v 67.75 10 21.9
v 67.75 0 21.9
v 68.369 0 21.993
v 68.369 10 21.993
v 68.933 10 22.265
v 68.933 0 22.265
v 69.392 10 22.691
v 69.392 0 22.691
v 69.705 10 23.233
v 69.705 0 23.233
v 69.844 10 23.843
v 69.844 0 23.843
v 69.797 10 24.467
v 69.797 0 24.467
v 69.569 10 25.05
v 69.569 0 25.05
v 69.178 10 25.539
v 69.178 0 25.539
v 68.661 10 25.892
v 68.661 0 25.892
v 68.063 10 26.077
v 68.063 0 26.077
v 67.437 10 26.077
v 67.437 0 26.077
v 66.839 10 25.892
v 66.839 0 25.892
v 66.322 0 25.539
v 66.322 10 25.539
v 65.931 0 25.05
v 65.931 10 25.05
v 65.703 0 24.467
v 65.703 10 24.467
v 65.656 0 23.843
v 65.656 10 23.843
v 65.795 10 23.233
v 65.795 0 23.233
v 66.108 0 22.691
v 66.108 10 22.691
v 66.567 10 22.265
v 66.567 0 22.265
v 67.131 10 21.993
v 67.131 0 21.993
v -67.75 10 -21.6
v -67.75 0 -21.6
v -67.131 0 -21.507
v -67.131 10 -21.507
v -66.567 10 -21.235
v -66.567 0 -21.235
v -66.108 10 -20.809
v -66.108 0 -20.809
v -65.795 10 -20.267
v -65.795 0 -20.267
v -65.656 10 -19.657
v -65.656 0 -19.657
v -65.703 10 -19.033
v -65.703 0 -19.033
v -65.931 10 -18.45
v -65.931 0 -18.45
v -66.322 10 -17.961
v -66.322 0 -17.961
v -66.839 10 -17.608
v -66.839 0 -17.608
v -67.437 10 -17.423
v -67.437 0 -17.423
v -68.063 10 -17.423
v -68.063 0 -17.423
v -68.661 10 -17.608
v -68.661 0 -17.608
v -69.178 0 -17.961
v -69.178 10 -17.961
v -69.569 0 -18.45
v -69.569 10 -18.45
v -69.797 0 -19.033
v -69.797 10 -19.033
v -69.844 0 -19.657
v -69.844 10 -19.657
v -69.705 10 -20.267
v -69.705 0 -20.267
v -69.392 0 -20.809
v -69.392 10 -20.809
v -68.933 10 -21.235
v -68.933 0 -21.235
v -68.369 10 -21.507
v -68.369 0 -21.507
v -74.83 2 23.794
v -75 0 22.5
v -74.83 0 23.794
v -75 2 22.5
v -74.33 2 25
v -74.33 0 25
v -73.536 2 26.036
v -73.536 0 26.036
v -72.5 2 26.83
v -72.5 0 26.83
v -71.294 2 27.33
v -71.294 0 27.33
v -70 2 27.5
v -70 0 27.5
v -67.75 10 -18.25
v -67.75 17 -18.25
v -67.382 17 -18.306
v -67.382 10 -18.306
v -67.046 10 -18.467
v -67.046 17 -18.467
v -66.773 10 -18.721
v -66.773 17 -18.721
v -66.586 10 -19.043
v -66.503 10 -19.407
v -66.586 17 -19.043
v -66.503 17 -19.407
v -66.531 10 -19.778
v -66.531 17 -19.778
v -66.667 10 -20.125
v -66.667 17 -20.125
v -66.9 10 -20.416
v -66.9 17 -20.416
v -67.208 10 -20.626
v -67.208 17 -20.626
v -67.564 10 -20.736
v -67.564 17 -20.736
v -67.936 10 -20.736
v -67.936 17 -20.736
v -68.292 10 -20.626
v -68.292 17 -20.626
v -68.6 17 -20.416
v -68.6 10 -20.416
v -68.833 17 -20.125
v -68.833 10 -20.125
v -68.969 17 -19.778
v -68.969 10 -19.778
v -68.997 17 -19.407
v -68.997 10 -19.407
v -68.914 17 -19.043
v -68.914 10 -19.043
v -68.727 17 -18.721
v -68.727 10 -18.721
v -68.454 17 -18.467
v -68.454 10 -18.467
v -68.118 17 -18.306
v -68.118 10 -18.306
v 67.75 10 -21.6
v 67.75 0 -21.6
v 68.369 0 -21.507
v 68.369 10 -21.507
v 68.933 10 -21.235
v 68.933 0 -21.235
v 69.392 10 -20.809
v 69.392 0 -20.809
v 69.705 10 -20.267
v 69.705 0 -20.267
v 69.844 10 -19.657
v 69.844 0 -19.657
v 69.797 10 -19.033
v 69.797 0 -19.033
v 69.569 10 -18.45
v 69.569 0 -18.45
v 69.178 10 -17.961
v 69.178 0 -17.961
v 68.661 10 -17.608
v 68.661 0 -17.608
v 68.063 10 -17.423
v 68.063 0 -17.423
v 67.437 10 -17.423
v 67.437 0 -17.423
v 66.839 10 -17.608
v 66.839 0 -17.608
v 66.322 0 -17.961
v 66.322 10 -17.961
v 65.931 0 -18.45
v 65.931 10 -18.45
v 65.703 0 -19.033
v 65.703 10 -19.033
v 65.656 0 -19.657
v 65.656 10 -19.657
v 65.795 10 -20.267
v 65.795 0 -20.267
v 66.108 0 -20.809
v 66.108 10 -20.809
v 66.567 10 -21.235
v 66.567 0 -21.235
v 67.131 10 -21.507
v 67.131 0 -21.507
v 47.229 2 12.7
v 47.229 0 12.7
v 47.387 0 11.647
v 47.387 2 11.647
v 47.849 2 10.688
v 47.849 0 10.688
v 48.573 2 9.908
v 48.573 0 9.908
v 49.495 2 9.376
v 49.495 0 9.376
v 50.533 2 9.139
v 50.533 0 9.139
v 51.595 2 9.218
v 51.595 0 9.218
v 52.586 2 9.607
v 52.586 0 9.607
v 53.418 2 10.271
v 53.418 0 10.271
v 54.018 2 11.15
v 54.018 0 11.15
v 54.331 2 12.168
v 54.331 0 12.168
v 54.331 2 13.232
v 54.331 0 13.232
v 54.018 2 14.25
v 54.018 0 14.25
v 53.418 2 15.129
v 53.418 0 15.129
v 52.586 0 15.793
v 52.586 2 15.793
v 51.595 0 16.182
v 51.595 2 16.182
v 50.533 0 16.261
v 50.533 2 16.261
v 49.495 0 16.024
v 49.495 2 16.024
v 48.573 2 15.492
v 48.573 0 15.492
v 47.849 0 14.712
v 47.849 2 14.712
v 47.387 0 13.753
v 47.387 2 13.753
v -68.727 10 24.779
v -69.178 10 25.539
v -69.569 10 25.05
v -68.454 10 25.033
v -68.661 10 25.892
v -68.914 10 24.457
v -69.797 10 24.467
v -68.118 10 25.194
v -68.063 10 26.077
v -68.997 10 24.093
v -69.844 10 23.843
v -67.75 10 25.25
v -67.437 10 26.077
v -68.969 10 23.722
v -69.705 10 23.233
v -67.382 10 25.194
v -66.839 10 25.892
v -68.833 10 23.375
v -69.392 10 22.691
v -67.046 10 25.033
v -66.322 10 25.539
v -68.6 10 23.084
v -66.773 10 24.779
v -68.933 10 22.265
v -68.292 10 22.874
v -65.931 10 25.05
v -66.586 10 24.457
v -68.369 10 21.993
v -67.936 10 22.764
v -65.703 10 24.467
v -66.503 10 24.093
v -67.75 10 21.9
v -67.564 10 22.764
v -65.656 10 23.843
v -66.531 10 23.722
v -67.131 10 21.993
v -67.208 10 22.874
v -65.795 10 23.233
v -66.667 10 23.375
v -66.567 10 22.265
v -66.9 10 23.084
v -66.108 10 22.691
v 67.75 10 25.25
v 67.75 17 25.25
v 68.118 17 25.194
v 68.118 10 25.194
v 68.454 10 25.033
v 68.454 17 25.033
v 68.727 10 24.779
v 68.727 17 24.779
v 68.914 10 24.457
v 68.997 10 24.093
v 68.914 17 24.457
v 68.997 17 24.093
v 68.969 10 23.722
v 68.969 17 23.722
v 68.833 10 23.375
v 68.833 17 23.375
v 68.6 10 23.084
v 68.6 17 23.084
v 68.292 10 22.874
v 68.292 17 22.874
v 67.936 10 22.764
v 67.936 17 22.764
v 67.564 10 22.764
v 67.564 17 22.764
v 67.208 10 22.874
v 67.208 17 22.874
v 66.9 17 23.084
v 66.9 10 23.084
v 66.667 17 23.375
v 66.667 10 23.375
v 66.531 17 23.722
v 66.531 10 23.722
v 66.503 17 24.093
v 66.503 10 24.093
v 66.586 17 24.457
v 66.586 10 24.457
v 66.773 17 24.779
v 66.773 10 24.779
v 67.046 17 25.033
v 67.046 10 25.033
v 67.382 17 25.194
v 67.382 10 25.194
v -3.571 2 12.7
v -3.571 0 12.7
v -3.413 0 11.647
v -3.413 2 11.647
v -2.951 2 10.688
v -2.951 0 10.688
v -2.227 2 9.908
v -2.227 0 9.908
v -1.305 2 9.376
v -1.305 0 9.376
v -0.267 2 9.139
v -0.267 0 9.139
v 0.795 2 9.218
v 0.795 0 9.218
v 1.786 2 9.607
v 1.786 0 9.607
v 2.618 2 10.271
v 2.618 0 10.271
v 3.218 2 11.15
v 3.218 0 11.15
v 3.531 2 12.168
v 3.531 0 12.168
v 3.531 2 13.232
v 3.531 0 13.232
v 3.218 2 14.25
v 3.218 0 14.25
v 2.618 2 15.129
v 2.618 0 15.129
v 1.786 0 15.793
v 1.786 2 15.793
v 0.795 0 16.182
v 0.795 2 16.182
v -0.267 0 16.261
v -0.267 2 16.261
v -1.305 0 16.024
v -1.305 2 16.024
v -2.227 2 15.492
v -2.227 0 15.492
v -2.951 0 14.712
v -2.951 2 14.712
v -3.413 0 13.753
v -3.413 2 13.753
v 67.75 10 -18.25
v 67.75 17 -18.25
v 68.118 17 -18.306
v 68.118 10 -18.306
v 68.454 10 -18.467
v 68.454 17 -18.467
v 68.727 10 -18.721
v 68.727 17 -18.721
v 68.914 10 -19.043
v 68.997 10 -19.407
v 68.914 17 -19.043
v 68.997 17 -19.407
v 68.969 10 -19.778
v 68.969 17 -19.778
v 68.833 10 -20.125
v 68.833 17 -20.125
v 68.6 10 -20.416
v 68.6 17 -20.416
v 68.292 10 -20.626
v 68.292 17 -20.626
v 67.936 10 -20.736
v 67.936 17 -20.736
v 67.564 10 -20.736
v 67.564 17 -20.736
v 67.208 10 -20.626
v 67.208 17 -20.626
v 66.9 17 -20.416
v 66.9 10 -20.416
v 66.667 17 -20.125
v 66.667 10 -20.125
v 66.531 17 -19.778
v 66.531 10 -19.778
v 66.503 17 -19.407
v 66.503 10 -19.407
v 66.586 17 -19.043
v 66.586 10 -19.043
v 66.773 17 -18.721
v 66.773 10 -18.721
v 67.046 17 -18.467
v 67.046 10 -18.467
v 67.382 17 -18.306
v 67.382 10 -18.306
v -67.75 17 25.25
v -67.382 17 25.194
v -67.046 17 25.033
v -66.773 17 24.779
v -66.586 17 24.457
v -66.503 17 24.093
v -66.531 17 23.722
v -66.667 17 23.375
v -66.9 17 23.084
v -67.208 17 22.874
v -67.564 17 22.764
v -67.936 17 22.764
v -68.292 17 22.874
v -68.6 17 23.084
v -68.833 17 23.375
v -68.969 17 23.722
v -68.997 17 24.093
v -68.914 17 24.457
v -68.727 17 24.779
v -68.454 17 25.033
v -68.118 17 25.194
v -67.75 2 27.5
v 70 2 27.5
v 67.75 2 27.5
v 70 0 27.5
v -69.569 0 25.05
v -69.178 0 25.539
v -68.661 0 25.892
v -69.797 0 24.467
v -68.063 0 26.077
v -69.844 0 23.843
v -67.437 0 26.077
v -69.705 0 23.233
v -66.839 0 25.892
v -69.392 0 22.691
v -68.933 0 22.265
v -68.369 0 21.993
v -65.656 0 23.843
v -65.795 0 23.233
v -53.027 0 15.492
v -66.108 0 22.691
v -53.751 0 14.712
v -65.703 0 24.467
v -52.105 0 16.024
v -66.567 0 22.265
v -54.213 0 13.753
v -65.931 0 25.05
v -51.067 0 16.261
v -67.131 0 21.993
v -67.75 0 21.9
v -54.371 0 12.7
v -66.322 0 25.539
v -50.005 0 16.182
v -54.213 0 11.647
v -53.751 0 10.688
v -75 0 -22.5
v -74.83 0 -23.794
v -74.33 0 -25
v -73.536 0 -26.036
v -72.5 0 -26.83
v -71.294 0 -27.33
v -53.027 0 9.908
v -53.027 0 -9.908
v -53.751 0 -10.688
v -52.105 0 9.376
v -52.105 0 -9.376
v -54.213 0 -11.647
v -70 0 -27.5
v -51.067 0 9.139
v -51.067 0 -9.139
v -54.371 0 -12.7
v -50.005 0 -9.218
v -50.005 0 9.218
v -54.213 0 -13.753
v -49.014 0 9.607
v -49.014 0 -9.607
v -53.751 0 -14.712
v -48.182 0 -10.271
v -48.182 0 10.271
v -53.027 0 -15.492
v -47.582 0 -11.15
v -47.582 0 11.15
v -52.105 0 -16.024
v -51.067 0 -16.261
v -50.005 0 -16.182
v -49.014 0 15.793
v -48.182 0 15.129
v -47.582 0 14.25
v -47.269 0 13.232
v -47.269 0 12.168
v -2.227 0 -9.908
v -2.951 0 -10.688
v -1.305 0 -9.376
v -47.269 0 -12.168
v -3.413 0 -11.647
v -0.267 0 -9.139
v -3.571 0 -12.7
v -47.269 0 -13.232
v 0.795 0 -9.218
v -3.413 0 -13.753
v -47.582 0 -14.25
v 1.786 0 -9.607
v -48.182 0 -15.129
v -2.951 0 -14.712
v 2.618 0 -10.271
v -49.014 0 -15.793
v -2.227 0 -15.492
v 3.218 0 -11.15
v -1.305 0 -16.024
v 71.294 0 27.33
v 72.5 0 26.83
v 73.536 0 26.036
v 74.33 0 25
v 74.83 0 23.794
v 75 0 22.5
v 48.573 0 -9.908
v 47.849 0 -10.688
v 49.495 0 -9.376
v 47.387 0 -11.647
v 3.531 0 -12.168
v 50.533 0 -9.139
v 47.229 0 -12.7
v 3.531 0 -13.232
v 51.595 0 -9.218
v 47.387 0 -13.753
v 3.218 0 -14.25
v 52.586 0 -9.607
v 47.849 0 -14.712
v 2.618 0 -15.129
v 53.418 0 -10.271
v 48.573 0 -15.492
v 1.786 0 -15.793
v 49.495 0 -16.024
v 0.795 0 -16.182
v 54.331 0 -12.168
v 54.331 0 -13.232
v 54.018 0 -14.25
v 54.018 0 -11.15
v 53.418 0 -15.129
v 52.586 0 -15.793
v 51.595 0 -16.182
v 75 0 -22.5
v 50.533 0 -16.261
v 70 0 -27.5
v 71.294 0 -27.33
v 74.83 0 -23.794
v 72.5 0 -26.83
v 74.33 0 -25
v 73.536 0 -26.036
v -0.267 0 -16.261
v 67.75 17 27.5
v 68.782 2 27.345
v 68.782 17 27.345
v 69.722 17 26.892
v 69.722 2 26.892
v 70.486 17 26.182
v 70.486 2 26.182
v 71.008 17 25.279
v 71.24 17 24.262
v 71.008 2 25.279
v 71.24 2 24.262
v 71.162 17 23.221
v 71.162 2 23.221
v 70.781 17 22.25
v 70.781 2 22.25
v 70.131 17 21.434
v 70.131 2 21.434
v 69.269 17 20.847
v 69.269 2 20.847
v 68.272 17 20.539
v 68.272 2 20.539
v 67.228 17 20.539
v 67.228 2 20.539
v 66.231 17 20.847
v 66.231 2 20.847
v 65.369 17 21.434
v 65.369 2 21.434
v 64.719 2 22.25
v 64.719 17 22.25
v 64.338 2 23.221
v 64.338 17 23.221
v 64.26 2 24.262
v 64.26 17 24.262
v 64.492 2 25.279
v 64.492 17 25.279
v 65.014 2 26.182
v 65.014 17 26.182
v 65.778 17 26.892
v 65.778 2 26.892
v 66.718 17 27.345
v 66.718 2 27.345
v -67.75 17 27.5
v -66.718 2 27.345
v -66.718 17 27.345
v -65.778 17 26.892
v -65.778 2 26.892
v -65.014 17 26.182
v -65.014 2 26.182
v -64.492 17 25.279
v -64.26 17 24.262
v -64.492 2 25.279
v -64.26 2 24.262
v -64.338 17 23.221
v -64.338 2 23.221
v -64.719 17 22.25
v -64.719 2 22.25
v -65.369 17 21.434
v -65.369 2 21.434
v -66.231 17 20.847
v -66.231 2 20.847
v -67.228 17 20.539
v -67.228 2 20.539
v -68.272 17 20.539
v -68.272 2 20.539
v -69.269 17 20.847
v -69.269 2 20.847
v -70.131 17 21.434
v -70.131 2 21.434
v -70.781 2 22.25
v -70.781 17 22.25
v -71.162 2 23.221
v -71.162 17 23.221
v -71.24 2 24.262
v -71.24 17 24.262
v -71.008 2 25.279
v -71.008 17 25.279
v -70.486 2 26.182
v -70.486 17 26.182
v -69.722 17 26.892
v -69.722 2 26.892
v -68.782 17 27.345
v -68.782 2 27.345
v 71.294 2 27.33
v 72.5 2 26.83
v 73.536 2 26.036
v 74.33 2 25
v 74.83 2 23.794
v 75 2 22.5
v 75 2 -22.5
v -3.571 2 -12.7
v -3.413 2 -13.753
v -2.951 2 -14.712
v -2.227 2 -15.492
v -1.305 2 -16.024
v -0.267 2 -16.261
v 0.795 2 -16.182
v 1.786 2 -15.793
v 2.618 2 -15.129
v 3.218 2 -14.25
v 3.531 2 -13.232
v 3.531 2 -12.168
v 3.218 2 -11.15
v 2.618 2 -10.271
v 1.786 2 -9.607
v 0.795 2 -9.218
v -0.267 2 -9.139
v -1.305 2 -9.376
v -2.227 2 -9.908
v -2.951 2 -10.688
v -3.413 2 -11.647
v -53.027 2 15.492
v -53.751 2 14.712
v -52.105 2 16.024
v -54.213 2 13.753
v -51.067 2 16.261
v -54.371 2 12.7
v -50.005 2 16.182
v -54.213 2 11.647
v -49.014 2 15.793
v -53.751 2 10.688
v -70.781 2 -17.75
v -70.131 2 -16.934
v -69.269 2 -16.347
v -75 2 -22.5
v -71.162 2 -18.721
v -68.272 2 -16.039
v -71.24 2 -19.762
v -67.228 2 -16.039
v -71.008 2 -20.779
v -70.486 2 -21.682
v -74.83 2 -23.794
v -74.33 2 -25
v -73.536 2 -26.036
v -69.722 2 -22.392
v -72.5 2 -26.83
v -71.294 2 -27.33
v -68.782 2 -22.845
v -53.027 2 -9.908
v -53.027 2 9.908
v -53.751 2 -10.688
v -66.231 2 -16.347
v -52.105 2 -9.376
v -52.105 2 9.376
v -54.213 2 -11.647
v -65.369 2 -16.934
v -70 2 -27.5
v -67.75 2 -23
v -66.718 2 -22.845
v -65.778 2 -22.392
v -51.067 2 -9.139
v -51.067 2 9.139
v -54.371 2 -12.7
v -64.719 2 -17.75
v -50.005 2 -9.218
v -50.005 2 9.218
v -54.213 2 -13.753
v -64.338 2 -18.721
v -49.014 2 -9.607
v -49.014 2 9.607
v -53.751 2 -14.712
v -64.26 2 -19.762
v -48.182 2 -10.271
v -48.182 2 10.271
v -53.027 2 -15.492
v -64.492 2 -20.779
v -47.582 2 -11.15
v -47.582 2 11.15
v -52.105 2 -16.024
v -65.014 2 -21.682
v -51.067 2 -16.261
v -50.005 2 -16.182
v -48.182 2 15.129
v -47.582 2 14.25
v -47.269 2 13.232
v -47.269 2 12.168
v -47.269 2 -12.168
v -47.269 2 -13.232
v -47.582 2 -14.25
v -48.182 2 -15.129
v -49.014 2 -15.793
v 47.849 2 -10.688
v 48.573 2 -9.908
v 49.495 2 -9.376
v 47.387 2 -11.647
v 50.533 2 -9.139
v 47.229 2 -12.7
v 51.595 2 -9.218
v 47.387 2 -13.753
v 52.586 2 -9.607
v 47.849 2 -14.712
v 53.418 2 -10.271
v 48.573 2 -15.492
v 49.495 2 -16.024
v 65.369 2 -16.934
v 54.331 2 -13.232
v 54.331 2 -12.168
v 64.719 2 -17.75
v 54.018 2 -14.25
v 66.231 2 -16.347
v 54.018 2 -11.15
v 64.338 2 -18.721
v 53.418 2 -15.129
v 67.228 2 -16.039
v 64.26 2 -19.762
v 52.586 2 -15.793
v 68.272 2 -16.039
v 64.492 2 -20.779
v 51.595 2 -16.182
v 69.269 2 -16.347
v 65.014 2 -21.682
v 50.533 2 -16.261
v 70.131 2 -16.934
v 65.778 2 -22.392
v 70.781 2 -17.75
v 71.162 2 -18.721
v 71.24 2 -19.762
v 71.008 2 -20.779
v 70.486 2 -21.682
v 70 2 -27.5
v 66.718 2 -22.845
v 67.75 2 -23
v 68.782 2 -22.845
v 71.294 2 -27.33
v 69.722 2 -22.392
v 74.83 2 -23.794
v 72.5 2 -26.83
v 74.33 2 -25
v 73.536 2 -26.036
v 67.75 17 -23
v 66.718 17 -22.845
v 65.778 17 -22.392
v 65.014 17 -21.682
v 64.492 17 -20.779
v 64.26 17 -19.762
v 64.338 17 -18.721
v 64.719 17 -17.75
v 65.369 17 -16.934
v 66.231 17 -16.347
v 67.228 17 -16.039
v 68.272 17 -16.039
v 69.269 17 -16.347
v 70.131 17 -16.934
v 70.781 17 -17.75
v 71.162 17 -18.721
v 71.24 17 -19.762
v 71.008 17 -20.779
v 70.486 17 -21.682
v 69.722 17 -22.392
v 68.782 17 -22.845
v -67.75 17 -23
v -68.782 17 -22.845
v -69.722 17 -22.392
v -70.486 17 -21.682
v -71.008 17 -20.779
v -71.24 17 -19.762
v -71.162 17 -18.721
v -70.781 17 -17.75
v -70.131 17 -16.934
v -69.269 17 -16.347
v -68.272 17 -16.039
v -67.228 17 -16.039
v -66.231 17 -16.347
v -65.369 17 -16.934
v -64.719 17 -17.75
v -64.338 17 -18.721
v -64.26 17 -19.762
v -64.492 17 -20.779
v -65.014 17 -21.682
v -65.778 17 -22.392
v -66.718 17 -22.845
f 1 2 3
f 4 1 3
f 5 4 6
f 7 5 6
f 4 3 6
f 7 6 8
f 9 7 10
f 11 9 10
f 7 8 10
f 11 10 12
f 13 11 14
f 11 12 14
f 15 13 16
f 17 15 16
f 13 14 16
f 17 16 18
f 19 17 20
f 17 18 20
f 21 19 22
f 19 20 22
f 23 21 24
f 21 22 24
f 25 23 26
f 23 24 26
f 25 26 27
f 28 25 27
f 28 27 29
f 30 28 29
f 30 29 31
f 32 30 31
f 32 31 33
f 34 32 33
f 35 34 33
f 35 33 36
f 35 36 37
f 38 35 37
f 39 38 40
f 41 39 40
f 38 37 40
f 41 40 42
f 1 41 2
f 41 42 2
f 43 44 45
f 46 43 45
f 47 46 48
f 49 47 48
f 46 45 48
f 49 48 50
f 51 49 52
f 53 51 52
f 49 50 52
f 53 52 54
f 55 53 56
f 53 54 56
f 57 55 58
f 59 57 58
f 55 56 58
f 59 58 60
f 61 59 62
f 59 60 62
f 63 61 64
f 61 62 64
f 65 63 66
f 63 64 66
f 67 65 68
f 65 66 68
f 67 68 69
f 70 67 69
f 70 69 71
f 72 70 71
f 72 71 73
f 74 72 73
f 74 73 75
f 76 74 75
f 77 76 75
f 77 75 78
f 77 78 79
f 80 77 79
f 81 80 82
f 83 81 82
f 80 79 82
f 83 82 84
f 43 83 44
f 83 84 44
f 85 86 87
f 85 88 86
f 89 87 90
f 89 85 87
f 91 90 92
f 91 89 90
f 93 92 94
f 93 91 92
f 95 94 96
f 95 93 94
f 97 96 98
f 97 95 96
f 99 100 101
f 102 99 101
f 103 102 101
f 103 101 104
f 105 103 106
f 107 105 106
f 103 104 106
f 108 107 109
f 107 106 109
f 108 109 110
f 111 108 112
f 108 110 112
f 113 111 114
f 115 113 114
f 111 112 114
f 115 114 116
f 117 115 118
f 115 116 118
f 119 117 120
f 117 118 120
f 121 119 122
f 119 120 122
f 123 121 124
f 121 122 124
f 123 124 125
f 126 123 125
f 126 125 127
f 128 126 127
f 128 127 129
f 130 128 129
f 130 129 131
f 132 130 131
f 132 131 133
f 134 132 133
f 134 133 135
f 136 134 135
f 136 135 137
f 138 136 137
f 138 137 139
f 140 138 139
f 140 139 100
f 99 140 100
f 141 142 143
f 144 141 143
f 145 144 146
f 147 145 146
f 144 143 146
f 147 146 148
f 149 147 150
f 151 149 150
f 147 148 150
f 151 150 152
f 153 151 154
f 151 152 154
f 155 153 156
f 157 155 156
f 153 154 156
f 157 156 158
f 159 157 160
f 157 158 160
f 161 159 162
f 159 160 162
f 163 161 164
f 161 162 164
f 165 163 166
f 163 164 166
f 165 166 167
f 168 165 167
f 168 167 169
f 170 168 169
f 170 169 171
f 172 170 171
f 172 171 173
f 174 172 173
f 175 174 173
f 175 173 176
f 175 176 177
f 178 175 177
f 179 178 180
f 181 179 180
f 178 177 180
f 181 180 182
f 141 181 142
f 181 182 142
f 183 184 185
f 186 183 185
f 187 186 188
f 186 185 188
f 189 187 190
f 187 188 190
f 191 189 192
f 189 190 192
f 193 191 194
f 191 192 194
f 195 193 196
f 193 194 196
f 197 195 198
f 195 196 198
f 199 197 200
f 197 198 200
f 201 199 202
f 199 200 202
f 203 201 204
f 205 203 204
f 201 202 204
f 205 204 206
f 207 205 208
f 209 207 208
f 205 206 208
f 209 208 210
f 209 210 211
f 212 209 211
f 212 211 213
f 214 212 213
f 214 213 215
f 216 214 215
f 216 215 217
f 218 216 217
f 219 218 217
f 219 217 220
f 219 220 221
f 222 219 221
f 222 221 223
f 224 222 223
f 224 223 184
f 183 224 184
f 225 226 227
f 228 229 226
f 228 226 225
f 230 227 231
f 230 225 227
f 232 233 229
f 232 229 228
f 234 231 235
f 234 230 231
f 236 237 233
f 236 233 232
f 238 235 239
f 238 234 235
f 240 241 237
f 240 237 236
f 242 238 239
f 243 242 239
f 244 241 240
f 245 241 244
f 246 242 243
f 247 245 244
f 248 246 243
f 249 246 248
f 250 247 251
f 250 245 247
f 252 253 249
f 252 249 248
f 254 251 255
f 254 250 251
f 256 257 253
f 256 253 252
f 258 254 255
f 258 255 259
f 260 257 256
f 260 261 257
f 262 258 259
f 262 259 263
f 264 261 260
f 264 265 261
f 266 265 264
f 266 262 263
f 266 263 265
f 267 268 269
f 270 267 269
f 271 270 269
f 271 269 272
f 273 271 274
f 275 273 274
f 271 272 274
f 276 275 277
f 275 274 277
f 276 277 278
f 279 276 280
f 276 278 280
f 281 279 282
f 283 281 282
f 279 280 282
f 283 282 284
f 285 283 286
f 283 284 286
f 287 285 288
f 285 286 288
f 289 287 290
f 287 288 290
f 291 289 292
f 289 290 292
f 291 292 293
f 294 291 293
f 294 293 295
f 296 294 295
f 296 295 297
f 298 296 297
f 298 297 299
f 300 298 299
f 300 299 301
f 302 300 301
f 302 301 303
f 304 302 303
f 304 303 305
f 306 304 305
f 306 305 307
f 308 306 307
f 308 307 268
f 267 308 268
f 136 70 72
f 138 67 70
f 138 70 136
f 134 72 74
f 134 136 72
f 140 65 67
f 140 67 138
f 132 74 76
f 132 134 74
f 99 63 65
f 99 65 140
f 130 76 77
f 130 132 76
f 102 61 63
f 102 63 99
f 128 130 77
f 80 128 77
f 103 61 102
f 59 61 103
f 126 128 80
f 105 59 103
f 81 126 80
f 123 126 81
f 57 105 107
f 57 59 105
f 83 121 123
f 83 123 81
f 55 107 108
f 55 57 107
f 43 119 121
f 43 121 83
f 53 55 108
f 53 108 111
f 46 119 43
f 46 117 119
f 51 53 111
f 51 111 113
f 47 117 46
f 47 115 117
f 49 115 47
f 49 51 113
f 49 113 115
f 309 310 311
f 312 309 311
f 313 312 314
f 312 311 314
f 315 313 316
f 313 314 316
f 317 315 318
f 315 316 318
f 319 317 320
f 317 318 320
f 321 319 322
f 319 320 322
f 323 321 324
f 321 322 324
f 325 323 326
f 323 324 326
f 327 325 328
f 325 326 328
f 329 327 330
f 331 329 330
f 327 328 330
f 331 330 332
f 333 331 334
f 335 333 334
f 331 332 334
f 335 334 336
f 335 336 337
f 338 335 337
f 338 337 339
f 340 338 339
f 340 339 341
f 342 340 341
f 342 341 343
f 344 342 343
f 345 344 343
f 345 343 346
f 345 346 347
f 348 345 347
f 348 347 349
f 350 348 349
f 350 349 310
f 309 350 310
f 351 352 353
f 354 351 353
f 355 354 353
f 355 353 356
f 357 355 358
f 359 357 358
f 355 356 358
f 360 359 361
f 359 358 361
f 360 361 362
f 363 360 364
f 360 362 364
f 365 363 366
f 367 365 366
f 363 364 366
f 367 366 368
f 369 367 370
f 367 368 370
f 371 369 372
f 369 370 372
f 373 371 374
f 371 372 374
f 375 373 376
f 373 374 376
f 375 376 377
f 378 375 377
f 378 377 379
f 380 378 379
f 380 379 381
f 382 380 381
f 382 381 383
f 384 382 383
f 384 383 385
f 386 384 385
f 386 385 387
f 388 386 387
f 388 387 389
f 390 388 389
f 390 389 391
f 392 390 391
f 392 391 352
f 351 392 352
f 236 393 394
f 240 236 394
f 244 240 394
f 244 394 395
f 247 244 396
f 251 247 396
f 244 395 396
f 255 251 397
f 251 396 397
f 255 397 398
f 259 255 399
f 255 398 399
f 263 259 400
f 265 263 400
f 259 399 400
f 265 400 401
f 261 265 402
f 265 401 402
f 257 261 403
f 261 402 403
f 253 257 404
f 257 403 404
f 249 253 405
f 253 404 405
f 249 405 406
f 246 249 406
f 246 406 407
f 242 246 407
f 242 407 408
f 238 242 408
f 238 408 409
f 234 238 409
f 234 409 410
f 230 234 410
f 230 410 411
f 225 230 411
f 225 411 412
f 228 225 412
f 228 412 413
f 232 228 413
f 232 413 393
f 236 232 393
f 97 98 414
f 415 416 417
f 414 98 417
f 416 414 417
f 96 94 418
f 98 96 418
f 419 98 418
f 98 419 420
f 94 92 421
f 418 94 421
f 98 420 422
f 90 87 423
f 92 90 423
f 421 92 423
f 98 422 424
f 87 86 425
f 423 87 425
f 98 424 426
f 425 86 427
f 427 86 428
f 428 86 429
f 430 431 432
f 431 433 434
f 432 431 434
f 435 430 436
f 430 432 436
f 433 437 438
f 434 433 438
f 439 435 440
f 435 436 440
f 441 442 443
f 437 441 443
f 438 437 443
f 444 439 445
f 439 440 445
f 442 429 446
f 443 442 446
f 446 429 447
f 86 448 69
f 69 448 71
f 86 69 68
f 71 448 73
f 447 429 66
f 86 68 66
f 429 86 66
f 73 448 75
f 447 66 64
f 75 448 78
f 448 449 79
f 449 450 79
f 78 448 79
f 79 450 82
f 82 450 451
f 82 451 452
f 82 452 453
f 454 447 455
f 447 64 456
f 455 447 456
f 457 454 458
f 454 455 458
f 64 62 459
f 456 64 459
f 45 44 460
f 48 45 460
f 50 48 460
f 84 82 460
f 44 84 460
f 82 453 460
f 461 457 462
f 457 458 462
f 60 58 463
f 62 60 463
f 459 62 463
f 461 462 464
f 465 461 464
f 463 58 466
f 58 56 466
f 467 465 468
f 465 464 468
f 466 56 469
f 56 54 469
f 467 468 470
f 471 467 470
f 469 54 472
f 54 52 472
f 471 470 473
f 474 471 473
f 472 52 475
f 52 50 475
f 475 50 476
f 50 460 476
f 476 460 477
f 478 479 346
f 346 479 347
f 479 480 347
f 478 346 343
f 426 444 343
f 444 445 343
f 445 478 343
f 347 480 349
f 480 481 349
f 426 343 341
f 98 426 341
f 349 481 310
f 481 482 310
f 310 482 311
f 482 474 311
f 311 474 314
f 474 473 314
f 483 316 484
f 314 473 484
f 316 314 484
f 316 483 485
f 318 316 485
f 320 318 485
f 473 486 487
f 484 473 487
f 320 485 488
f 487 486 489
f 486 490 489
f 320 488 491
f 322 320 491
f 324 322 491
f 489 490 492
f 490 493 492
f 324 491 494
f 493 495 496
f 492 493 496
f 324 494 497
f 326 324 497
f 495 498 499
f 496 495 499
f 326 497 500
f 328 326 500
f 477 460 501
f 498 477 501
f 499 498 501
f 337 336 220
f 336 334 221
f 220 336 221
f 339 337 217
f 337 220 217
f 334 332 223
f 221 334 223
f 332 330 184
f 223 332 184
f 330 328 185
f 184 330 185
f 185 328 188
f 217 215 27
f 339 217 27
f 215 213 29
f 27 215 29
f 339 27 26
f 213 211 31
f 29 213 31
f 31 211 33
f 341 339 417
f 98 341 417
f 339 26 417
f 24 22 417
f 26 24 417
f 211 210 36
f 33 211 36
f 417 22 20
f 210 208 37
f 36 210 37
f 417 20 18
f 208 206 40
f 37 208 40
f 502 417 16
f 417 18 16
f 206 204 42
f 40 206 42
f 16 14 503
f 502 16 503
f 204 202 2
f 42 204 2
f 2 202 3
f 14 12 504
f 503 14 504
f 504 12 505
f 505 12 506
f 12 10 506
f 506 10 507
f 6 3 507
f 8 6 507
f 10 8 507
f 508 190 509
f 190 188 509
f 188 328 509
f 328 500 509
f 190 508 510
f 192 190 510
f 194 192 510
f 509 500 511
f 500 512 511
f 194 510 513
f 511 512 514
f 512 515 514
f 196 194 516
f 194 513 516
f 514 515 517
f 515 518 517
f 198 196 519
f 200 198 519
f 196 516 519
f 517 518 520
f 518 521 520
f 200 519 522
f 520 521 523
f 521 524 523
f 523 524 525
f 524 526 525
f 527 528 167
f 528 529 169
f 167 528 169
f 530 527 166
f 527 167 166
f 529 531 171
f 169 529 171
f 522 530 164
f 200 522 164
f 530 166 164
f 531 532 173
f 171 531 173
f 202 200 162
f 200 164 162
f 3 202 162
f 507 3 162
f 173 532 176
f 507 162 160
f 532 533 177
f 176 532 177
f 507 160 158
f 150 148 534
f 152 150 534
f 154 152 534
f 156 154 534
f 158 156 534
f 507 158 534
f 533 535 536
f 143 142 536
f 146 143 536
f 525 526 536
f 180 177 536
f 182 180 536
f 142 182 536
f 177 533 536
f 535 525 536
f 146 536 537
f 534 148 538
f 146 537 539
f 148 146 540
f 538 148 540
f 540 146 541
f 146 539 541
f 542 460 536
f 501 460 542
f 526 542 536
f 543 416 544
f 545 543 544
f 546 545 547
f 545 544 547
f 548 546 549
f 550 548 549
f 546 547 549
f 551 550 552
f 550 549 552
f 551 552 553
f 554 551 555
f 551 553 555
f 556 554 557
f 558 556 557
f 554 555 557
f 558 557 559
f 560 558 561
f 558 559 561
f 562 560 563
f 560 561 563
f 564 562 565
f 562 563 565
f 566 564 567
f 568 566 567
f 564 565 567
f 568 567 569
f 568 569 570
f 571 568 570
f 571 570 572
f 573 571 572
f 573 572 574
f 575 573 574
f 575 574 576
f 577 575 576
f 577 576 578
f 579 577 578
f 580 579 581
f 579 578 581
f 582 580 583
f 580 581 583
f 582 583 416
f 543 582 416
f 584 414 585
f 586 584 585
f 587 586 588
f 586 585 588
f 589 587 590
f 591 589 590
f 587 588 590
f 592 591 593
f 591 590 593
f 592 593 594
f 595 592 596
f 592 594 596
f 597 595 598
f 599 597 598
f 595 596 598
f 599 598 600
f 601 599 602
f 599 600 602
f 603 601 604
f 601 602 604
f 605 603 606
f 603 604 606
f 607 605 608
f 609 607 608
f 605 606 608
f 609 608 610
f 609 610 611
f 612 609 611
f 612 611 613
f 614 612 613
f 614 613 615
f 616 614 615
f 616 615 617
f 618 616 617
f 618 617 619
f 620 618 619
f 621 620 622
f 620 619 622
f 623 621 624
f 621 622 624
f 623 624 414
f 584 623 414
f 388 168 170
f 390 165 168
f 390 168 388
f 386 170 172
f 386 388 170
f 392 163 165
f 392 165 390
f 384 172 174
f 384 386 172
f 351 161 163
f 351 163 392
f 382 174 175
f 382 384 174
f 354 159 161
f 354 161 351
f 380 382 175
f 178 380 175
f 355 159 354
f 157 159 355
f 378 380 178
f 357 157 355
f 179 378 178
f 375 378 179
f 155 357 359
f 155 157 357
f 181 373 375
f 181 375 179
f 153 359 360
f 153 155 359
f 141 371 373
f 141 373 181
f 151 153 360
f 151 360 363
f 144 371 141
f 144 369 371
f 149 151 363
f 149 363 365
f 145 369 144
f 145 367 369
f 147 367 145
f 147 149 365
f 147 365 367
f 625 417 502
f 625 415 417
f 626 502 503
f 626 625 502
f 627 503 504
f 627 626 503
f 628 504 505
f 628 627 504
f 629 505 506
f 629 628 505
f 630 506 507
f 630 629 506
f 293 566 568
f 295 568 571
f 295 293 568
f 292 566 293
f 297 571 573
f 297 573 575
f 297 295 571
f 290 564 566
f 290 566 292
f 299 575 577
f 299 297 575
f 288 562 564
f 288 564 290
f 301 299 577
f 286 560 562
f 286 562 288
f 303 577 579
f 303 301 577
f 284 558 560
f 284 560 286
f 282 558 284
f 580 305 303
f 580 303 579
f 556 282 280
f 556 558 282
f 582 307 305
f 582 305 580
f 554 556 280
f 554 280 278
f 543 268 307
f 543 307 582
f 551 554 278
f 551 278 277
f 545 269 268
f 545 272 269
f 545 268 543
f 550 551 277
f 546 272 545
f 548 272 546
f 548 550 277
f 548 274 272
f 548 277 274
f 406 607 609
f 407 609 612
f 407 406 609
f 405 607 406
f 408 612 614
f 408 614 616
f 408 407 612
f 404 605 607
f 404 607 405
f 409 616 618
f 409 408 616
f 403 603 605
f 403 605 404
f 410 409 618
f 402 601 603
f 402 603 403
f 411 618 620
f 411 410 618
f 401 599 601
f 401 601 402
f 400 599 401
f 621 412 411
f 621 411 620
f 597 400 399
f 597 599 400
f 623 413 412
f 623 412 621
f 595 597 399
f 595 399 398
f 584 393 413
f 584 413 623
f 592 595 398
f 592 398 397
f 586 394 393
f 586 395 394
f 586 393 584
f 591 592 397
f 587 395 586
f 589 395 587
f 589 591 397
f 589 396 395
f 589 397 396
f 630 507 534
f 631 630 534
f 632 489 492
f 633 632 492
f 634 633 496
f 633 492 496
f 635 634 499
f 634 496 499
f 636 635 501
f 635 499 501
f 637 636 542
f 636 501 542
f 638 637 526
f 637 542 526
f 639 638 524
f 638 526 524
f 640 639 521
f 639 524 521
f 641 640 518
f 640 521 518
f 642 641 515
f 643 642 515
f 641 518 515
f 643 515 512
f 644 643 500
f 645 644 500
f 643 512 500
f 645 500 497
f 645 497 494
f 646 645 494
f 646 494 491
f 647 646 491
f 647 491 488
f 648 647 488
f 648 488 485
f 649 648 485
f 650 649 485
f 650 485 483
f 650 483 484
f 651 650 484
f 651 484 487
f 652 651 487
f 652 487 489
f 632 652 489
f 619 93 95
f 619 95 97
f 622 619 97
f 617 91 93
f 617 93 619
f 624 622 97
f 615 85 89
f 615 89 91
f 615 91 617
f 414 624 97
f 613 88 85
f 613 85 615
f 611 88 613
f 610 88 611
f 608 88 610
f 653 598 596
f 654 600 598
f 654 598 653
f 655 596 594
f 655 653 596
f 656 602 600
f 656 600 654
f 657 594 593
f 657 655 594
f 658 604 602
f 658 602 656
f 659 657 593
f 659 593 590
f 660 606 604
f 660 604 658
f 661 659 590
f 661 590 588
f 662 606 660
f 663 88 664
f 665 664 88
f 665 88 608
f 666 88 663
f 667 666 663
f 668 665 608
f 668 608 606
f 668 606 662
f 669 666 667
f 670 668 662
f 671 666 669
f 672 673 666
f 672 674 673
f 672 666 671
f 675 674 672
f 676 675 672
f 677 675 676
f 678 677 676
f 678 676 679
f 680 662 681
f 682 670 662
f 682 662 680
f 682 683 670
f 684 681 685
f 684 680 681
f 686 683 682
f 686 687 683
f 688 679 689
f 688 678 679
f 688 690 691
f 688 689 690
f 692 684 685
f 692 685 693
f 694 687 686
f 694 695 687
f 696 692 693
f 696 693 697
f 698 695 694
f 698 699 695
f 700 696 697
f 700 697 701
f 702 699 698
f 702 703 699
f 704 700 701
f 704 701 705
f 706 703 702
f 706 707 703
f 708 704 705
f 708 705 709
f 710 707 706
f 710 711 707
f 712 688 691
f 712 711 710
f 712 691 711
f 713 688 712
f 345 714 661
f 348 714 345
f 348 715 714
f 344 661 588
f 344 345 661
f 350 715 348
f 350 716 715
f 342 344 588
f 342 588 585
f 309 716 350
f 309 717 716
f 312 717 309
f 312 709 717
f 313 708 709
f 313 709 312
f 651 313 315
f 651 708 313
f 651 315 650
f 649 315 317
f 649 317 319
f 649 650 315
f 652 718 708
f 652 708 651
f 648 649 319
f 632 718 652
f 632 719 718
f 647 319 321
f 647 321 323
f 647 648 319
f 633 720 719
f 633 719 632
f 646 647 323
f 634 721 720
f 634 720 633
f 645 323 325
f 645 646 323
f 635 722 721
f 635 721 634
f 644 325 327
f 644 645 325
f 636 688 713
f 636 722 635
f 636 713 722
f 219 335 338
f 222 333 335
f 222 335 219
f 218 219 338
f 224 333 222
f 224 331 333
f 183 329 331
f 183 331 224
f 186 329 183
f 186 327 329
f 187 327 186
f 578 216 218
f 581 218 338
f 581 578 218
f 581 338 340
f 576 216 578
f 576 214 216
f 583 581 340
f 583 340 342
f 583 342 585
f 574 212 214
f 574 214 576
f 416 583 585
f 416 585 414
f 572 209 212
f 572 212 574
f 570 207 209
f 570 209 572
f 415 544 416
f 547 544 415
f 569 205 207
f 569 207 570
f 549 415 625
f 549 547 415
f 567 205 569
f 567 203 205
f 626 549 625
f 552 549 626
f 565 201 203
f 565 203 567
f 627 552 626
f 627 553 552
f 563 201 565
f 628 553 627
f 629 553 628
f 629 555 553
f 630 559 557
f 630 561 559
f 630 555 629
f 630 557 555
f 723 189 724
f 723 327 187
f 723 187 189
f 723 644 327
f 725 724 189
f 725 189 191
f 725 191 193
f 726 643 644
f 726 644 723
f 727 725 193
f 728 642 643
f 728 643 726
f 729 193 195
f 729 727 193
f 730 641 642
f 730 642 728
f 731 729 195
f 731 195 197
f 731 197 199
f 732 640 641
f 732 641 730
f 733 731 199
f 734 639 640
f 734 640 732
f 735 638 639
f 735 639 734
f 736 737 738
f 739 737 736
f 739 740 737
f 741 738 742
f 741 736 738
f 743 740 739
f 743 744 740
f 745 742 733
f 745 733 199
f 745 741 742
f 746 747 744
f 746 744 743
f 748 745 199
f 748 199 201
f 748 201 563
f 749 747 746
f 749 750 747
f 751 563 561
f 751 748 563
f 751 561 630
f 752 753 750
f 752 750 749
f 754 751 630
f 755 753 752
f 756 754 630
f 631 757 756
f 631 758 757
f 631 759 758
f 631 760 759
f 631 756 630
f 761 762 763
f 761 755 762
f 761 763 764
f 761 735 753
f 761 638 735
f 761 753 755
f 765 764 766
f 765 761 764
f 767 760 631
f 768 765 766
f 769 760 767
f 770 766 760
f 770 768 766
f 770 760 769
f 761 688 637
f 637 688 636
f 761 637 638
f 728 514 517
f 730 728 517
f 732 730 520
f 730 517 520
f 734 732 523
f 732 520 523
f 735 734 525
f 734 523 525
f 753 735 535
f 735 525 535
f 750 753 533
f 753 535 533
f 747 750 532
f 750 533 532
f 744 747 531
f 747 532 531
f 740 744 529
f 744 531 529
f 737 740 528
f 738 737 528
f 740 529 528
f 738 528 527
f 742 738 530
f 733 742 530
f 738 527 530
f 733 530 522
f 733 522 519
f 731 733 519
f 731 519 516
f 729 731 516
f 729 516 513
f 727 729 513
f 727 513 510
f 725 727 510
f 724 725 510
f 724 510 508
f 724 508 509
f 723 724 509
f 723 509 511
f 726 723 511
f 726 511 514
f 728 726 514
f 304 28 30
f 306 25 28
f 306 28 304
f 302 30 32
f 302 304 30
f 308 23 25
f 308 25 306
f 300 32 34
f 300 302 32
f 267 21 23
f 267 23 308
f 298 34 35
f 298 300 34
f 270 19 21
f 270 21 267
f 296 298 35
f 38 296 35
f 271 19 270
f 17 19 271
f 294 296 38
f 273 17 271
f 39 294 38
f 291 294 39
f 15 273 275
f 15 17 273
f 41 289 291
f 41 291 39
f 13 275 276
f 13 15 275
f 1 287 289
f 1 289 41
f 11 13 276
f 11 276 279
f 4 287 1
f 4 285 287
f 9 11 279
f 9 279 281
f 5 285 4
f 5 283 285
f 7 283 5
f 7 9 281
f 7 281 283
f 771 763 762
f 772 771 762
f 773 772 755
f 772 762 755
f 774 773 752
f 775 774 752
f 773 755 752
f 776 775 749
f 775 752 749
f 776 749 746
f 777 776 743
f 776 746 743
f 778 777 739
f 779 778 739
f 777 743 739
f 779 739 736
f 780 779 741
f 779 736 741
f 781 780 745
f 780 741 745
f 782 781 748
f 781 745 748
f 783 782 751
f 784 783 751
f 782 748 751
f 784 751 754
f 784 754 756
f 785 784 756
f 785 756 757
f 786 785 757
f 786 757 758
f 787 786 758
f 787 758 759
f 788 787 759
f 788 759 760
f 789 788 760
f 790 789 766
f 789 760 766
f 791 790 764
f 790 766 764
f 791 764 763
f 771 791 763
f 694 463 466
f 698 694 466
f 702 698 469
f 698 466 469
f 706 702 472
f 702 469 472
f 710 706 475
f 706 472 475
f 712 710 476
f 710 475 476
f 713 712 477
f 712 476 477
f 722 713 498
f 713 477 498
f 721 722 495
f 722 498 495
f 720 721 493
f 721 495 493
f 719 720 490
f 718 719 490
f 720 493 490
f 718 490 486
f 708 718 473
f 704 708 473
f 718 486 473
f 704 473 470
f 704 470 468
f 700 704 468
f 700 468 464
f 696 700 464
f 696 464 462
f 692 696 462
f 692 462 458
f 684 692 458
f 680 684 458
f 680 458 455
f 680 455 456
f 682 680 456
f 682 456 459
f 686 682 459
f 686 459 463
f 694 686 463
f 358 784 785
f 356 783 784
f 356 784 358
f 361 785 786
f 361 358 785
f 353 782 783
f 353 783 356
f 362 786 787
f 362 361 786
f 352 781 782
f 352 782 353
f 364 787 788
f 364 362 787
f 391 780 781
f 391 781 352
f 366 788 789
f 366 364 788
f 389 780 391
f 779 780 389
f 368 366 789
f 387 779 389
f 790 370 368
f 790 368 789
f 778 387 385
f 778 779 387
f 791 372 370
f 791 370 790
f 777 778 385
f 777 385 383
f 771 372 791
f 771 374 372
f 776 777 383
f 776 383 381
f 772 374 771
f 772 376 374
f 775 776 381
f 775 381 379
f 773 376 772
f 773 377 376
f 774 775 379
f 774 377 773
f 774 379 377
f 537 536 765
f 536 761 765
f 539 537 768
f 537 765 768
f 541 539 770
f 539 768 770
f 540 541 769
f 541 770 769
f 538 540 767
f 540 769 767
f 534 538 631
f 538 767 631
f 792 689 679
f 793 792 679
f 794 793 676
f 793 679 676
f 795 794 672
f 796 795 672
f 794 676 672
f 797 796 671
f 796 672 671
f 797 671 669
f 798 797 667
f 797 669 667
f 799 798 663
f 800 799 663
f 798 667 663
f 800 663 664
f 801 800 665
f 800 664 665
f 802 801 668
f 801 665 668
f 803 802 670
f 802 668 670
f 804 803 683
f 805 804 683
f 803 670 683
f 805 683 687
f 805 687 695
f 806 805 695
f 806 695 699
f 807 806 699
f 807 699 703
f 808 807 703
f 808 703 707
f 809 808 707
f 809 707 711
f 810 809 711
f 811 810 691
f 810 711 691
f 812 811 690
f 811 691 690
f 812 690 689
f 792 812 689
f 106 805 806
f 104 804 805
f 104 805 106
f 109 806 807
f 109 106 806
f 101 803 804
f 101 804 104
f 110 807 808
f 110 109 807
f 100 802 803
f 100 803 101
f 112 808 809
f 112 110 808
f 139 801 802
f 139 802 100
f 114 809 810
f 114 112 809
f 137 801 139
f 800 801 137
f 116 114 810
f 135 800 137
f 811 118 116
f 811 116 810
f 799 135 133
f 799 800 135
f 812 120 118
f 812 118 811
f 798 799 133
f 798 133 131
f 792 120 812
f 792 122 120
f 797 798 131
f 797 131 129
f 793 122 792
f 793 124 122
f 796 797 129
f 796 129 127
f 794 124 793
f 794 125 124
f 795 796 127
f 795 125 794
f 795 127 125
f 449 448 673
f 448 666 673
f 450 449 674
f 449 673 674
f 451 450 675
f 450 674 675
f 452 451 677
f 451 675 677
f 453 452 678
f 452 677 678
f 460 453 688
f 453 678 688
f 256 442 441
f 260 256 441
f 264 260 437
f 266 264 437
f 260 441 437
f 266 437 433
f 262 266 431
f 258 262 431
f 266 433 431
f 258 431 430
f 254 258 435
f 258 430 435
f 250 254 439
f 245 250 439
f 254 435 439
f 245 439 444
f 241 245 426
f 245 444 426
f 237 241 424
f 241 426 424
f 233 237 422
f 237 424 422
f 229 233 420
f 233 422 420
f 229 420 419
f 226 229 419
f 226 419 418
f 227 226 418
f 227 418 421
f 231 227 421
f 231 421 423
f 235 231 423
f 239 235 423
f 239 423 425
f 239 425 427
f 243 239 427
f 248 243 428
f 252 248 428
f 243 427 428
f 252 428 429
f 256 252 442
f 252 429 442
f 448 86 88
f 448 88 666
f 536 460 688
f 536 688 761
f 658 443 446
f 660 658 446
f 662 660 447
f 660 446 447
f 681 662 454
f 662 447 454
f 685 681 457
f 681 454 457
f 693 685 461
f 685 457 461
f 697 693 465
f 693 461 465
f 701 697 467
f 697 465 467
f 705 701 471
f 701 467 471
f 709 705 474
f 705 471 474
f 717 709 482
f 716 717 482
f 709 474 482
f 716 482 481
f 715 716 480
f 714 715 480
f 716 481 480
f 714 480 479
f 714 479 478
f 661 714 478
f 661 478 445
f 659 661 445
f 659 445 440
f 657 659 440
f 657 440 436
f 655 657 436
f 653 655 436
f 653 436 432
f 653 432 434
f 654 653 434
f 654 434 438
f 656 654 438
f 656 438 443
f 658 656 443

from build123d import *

# Parameters (mm, degrees)
SKETCH1_W               = 150
SKETCH1_H               = 55
BOSS_EXTRUDE1_DEPTH     = 2
SKETCH2_R               = 3.5
BOSS_EXTRUDE2_DEPTH     = 15
CUT_EXTRUDE1_REACH      = 83.672
SKETCH3_R               = 1.25
FILLET1_R               = 5
F_1_4_CLEARANCE_HOLE1_D = 7.14248
SKETCH8_R               = 2.1
CUT_EXTRUDE2_DEPTH      = 10


with BuildPart() as part:
    # Sketch1 → Boss-Extrude1 (new body)
    with BuildSketch(Plane(origin=(0, 0, 0), x_dir=(1, 0, 0), z_dir=(0, 1, 0))):
        Rectangle(SKETCH1_W, SKETCH1_H)
    extrude(amount=BOSS_EXTRUDE1_DEPTH)

    # Sketch2 → Boss-Extrude2 (add)
    with BuildSketch(Plane(origin=(0, 2, 0), x_dir=(1, 0, 0), z_dir=(0, 1, 0))):
        with Locations(Location((-67.75, -24, 0), (0, 0, 270))):
            Circle(SKETCH2_R)
        with Locations(Location((-67.75, 19.5, 0), (0, 0, 90))):
            Circle(SKETCH2_R)
        with Locations(Location((67.75, 19.5, 0), (0, 0, 90))):
            Circle(SKETCH2_R)
        with Locations(Location((67.75, -24, 0), (0, 0, 270))):
            Circle(SKETCH2_R)
    extrude(amount=BOSS_EXTRUDE2_DEPTH)

    # Sketch3 → Cut-Extrude1 (cut, up to next)
    with BuildSketch(Plane(origin=(0, 17, 0), x_dir=(1, 0, 0), z_dir=(0, 1, 0)), mode=Mode.PRIVATE) as cut_extrude1_sk1:
        with Locations(Location((-67.75, -24, 0), (0, 0, 270))):
            Circle(SKETCH3_R)
    cut_extrude1_tool1 = extrude(cut_extrude1_sk1.sketch, amount=-CUT_EXTRUDE1_REACH, mode=Mode.PRIVATE) & part.part
    # Sketch3 → Cut-Extrude1 (cut, up to next)
    with BuildSketch(Plane(origin=(0, 17, 0), x_dir=(1, 0, 0), z_dir=(0, 1, 0)), mode=Mode.PRIVATE) as cut_extrude1_sk2:
        with Locations(Location((-67.75, 19.5, 0), (0, 0, 270))):
            Circle(SKETCH3_R)
    cut_extrude1_tool2 = extrude(cut_extrude1_sk2.sketch, amount=-CUT_EXTRUDE1_REACH, mode=Mode.PRIVATE) & part.part
    # Sketch3 → Cut-Extrude1 (cut, up to next)
    with BuildSketch(Plane(origin=(0, 17, 0), x_dir=(1, 0, 0), z_dir=(0, 1, 0)), mode=Mode.PRIVATE) as cut_extrude1_sk3:
        with Locations(Location((67.75, 19.5, 0), (0, 0, 270))):
            Circle(SKETCH3_R)
    cut_extrude1_tool3 = extrude(cut_extrude1_sk3.sketch, amount=-CUT_EXTRUDE1_REACH, mode=Mode.PRIVATE) & part.part
    # Sketch3 → Cut-Extrude1 (cut, up to next)
    with BuildSketch(Plane(origin=(0, 17, 0), x_dir=(1, 0, 0), z_dir=(0, 1, 0)), mode=Mode.PRIVATE) as cut_extrude1_sk4:
        with Locations(Location((67.75, -24, 0), (0, 0, 270))):
            Circle(SKETCH3_R)
    cut_extrude1_tool4 = extrude(cut_extrude1_sk4.sketch, amount=-CUT_EXTRUDE1_REACH, mode=Mode.PRIVATE) & part.part
    add(cut_extrude1_tool1.solids().sort_by_distance((-67.75, 17, 24))[0], mode=Mode.SUBTRACT)
    add(cut_extrude1_tool2.solids().sort_by_distance((-67.75, 17, -19.5))[0], mode=Mode.SUBTRACT)
    add(cut_extrude1_tool3.solids().sort_by_distance((67.75, 17, -19.5))[0], mode=Mode.SUBTRACT)
    add(cut_extrude1_tool4.solids().sort_by_distance((67.75, 17, 24))[0], mode=Mode.SUBTRACT)

    # Fillet1
    fillet1_edges = [part.edges().sort_by_distance(p)[0] for p in [
        (75, 1, 27.5),
        (-75, 1, 27.5),
        (-75, 1, -27.5),
        (75, 1, -27.5),
    ]]
    fillet(fillet1_edges, radius=FILLET1_R)

    # 1/4 Clearance Hole1 (through all)
    with Locations(Plane(origin=(0, 2, 0), x_dir=(1, 0, 0), z_dir=(0, 1, 0))):
        with Locations((-50.8, 12.7), (50.8, 12.7), (50.8, -12.7), (-50.8, -12.7), (0, -12.7), (0, 12.7)):
            Hole(F_1_4_CLEARANCE_HOLE1_D / 2)

    # Sketch8 → Cut-Extrude2 (cut)
    with BuildSketch(Plane.XZ):
        with Locations(Location((-67.75, 24, 0), (0, 0, 270))):
            Circle(SKETCH8_R)
        with Locations(Location((-67.75, -19.5, 0), (0, 0, 270))):
            Circle(SKETCH8_R)
        with Locations(Location((67.75, -19.5, 0), (0, 0, 270))):
            Circle(SKETCH8_R)
        with Locations(Location((67.75, 24, 0), (0, 0, 270))):
            Circle(SKETCH8_R)
    extrude(amount=-CUT_EXTRUDE2_DEPTH, mode=Mode.SUBTRACT)


solid = part.part
